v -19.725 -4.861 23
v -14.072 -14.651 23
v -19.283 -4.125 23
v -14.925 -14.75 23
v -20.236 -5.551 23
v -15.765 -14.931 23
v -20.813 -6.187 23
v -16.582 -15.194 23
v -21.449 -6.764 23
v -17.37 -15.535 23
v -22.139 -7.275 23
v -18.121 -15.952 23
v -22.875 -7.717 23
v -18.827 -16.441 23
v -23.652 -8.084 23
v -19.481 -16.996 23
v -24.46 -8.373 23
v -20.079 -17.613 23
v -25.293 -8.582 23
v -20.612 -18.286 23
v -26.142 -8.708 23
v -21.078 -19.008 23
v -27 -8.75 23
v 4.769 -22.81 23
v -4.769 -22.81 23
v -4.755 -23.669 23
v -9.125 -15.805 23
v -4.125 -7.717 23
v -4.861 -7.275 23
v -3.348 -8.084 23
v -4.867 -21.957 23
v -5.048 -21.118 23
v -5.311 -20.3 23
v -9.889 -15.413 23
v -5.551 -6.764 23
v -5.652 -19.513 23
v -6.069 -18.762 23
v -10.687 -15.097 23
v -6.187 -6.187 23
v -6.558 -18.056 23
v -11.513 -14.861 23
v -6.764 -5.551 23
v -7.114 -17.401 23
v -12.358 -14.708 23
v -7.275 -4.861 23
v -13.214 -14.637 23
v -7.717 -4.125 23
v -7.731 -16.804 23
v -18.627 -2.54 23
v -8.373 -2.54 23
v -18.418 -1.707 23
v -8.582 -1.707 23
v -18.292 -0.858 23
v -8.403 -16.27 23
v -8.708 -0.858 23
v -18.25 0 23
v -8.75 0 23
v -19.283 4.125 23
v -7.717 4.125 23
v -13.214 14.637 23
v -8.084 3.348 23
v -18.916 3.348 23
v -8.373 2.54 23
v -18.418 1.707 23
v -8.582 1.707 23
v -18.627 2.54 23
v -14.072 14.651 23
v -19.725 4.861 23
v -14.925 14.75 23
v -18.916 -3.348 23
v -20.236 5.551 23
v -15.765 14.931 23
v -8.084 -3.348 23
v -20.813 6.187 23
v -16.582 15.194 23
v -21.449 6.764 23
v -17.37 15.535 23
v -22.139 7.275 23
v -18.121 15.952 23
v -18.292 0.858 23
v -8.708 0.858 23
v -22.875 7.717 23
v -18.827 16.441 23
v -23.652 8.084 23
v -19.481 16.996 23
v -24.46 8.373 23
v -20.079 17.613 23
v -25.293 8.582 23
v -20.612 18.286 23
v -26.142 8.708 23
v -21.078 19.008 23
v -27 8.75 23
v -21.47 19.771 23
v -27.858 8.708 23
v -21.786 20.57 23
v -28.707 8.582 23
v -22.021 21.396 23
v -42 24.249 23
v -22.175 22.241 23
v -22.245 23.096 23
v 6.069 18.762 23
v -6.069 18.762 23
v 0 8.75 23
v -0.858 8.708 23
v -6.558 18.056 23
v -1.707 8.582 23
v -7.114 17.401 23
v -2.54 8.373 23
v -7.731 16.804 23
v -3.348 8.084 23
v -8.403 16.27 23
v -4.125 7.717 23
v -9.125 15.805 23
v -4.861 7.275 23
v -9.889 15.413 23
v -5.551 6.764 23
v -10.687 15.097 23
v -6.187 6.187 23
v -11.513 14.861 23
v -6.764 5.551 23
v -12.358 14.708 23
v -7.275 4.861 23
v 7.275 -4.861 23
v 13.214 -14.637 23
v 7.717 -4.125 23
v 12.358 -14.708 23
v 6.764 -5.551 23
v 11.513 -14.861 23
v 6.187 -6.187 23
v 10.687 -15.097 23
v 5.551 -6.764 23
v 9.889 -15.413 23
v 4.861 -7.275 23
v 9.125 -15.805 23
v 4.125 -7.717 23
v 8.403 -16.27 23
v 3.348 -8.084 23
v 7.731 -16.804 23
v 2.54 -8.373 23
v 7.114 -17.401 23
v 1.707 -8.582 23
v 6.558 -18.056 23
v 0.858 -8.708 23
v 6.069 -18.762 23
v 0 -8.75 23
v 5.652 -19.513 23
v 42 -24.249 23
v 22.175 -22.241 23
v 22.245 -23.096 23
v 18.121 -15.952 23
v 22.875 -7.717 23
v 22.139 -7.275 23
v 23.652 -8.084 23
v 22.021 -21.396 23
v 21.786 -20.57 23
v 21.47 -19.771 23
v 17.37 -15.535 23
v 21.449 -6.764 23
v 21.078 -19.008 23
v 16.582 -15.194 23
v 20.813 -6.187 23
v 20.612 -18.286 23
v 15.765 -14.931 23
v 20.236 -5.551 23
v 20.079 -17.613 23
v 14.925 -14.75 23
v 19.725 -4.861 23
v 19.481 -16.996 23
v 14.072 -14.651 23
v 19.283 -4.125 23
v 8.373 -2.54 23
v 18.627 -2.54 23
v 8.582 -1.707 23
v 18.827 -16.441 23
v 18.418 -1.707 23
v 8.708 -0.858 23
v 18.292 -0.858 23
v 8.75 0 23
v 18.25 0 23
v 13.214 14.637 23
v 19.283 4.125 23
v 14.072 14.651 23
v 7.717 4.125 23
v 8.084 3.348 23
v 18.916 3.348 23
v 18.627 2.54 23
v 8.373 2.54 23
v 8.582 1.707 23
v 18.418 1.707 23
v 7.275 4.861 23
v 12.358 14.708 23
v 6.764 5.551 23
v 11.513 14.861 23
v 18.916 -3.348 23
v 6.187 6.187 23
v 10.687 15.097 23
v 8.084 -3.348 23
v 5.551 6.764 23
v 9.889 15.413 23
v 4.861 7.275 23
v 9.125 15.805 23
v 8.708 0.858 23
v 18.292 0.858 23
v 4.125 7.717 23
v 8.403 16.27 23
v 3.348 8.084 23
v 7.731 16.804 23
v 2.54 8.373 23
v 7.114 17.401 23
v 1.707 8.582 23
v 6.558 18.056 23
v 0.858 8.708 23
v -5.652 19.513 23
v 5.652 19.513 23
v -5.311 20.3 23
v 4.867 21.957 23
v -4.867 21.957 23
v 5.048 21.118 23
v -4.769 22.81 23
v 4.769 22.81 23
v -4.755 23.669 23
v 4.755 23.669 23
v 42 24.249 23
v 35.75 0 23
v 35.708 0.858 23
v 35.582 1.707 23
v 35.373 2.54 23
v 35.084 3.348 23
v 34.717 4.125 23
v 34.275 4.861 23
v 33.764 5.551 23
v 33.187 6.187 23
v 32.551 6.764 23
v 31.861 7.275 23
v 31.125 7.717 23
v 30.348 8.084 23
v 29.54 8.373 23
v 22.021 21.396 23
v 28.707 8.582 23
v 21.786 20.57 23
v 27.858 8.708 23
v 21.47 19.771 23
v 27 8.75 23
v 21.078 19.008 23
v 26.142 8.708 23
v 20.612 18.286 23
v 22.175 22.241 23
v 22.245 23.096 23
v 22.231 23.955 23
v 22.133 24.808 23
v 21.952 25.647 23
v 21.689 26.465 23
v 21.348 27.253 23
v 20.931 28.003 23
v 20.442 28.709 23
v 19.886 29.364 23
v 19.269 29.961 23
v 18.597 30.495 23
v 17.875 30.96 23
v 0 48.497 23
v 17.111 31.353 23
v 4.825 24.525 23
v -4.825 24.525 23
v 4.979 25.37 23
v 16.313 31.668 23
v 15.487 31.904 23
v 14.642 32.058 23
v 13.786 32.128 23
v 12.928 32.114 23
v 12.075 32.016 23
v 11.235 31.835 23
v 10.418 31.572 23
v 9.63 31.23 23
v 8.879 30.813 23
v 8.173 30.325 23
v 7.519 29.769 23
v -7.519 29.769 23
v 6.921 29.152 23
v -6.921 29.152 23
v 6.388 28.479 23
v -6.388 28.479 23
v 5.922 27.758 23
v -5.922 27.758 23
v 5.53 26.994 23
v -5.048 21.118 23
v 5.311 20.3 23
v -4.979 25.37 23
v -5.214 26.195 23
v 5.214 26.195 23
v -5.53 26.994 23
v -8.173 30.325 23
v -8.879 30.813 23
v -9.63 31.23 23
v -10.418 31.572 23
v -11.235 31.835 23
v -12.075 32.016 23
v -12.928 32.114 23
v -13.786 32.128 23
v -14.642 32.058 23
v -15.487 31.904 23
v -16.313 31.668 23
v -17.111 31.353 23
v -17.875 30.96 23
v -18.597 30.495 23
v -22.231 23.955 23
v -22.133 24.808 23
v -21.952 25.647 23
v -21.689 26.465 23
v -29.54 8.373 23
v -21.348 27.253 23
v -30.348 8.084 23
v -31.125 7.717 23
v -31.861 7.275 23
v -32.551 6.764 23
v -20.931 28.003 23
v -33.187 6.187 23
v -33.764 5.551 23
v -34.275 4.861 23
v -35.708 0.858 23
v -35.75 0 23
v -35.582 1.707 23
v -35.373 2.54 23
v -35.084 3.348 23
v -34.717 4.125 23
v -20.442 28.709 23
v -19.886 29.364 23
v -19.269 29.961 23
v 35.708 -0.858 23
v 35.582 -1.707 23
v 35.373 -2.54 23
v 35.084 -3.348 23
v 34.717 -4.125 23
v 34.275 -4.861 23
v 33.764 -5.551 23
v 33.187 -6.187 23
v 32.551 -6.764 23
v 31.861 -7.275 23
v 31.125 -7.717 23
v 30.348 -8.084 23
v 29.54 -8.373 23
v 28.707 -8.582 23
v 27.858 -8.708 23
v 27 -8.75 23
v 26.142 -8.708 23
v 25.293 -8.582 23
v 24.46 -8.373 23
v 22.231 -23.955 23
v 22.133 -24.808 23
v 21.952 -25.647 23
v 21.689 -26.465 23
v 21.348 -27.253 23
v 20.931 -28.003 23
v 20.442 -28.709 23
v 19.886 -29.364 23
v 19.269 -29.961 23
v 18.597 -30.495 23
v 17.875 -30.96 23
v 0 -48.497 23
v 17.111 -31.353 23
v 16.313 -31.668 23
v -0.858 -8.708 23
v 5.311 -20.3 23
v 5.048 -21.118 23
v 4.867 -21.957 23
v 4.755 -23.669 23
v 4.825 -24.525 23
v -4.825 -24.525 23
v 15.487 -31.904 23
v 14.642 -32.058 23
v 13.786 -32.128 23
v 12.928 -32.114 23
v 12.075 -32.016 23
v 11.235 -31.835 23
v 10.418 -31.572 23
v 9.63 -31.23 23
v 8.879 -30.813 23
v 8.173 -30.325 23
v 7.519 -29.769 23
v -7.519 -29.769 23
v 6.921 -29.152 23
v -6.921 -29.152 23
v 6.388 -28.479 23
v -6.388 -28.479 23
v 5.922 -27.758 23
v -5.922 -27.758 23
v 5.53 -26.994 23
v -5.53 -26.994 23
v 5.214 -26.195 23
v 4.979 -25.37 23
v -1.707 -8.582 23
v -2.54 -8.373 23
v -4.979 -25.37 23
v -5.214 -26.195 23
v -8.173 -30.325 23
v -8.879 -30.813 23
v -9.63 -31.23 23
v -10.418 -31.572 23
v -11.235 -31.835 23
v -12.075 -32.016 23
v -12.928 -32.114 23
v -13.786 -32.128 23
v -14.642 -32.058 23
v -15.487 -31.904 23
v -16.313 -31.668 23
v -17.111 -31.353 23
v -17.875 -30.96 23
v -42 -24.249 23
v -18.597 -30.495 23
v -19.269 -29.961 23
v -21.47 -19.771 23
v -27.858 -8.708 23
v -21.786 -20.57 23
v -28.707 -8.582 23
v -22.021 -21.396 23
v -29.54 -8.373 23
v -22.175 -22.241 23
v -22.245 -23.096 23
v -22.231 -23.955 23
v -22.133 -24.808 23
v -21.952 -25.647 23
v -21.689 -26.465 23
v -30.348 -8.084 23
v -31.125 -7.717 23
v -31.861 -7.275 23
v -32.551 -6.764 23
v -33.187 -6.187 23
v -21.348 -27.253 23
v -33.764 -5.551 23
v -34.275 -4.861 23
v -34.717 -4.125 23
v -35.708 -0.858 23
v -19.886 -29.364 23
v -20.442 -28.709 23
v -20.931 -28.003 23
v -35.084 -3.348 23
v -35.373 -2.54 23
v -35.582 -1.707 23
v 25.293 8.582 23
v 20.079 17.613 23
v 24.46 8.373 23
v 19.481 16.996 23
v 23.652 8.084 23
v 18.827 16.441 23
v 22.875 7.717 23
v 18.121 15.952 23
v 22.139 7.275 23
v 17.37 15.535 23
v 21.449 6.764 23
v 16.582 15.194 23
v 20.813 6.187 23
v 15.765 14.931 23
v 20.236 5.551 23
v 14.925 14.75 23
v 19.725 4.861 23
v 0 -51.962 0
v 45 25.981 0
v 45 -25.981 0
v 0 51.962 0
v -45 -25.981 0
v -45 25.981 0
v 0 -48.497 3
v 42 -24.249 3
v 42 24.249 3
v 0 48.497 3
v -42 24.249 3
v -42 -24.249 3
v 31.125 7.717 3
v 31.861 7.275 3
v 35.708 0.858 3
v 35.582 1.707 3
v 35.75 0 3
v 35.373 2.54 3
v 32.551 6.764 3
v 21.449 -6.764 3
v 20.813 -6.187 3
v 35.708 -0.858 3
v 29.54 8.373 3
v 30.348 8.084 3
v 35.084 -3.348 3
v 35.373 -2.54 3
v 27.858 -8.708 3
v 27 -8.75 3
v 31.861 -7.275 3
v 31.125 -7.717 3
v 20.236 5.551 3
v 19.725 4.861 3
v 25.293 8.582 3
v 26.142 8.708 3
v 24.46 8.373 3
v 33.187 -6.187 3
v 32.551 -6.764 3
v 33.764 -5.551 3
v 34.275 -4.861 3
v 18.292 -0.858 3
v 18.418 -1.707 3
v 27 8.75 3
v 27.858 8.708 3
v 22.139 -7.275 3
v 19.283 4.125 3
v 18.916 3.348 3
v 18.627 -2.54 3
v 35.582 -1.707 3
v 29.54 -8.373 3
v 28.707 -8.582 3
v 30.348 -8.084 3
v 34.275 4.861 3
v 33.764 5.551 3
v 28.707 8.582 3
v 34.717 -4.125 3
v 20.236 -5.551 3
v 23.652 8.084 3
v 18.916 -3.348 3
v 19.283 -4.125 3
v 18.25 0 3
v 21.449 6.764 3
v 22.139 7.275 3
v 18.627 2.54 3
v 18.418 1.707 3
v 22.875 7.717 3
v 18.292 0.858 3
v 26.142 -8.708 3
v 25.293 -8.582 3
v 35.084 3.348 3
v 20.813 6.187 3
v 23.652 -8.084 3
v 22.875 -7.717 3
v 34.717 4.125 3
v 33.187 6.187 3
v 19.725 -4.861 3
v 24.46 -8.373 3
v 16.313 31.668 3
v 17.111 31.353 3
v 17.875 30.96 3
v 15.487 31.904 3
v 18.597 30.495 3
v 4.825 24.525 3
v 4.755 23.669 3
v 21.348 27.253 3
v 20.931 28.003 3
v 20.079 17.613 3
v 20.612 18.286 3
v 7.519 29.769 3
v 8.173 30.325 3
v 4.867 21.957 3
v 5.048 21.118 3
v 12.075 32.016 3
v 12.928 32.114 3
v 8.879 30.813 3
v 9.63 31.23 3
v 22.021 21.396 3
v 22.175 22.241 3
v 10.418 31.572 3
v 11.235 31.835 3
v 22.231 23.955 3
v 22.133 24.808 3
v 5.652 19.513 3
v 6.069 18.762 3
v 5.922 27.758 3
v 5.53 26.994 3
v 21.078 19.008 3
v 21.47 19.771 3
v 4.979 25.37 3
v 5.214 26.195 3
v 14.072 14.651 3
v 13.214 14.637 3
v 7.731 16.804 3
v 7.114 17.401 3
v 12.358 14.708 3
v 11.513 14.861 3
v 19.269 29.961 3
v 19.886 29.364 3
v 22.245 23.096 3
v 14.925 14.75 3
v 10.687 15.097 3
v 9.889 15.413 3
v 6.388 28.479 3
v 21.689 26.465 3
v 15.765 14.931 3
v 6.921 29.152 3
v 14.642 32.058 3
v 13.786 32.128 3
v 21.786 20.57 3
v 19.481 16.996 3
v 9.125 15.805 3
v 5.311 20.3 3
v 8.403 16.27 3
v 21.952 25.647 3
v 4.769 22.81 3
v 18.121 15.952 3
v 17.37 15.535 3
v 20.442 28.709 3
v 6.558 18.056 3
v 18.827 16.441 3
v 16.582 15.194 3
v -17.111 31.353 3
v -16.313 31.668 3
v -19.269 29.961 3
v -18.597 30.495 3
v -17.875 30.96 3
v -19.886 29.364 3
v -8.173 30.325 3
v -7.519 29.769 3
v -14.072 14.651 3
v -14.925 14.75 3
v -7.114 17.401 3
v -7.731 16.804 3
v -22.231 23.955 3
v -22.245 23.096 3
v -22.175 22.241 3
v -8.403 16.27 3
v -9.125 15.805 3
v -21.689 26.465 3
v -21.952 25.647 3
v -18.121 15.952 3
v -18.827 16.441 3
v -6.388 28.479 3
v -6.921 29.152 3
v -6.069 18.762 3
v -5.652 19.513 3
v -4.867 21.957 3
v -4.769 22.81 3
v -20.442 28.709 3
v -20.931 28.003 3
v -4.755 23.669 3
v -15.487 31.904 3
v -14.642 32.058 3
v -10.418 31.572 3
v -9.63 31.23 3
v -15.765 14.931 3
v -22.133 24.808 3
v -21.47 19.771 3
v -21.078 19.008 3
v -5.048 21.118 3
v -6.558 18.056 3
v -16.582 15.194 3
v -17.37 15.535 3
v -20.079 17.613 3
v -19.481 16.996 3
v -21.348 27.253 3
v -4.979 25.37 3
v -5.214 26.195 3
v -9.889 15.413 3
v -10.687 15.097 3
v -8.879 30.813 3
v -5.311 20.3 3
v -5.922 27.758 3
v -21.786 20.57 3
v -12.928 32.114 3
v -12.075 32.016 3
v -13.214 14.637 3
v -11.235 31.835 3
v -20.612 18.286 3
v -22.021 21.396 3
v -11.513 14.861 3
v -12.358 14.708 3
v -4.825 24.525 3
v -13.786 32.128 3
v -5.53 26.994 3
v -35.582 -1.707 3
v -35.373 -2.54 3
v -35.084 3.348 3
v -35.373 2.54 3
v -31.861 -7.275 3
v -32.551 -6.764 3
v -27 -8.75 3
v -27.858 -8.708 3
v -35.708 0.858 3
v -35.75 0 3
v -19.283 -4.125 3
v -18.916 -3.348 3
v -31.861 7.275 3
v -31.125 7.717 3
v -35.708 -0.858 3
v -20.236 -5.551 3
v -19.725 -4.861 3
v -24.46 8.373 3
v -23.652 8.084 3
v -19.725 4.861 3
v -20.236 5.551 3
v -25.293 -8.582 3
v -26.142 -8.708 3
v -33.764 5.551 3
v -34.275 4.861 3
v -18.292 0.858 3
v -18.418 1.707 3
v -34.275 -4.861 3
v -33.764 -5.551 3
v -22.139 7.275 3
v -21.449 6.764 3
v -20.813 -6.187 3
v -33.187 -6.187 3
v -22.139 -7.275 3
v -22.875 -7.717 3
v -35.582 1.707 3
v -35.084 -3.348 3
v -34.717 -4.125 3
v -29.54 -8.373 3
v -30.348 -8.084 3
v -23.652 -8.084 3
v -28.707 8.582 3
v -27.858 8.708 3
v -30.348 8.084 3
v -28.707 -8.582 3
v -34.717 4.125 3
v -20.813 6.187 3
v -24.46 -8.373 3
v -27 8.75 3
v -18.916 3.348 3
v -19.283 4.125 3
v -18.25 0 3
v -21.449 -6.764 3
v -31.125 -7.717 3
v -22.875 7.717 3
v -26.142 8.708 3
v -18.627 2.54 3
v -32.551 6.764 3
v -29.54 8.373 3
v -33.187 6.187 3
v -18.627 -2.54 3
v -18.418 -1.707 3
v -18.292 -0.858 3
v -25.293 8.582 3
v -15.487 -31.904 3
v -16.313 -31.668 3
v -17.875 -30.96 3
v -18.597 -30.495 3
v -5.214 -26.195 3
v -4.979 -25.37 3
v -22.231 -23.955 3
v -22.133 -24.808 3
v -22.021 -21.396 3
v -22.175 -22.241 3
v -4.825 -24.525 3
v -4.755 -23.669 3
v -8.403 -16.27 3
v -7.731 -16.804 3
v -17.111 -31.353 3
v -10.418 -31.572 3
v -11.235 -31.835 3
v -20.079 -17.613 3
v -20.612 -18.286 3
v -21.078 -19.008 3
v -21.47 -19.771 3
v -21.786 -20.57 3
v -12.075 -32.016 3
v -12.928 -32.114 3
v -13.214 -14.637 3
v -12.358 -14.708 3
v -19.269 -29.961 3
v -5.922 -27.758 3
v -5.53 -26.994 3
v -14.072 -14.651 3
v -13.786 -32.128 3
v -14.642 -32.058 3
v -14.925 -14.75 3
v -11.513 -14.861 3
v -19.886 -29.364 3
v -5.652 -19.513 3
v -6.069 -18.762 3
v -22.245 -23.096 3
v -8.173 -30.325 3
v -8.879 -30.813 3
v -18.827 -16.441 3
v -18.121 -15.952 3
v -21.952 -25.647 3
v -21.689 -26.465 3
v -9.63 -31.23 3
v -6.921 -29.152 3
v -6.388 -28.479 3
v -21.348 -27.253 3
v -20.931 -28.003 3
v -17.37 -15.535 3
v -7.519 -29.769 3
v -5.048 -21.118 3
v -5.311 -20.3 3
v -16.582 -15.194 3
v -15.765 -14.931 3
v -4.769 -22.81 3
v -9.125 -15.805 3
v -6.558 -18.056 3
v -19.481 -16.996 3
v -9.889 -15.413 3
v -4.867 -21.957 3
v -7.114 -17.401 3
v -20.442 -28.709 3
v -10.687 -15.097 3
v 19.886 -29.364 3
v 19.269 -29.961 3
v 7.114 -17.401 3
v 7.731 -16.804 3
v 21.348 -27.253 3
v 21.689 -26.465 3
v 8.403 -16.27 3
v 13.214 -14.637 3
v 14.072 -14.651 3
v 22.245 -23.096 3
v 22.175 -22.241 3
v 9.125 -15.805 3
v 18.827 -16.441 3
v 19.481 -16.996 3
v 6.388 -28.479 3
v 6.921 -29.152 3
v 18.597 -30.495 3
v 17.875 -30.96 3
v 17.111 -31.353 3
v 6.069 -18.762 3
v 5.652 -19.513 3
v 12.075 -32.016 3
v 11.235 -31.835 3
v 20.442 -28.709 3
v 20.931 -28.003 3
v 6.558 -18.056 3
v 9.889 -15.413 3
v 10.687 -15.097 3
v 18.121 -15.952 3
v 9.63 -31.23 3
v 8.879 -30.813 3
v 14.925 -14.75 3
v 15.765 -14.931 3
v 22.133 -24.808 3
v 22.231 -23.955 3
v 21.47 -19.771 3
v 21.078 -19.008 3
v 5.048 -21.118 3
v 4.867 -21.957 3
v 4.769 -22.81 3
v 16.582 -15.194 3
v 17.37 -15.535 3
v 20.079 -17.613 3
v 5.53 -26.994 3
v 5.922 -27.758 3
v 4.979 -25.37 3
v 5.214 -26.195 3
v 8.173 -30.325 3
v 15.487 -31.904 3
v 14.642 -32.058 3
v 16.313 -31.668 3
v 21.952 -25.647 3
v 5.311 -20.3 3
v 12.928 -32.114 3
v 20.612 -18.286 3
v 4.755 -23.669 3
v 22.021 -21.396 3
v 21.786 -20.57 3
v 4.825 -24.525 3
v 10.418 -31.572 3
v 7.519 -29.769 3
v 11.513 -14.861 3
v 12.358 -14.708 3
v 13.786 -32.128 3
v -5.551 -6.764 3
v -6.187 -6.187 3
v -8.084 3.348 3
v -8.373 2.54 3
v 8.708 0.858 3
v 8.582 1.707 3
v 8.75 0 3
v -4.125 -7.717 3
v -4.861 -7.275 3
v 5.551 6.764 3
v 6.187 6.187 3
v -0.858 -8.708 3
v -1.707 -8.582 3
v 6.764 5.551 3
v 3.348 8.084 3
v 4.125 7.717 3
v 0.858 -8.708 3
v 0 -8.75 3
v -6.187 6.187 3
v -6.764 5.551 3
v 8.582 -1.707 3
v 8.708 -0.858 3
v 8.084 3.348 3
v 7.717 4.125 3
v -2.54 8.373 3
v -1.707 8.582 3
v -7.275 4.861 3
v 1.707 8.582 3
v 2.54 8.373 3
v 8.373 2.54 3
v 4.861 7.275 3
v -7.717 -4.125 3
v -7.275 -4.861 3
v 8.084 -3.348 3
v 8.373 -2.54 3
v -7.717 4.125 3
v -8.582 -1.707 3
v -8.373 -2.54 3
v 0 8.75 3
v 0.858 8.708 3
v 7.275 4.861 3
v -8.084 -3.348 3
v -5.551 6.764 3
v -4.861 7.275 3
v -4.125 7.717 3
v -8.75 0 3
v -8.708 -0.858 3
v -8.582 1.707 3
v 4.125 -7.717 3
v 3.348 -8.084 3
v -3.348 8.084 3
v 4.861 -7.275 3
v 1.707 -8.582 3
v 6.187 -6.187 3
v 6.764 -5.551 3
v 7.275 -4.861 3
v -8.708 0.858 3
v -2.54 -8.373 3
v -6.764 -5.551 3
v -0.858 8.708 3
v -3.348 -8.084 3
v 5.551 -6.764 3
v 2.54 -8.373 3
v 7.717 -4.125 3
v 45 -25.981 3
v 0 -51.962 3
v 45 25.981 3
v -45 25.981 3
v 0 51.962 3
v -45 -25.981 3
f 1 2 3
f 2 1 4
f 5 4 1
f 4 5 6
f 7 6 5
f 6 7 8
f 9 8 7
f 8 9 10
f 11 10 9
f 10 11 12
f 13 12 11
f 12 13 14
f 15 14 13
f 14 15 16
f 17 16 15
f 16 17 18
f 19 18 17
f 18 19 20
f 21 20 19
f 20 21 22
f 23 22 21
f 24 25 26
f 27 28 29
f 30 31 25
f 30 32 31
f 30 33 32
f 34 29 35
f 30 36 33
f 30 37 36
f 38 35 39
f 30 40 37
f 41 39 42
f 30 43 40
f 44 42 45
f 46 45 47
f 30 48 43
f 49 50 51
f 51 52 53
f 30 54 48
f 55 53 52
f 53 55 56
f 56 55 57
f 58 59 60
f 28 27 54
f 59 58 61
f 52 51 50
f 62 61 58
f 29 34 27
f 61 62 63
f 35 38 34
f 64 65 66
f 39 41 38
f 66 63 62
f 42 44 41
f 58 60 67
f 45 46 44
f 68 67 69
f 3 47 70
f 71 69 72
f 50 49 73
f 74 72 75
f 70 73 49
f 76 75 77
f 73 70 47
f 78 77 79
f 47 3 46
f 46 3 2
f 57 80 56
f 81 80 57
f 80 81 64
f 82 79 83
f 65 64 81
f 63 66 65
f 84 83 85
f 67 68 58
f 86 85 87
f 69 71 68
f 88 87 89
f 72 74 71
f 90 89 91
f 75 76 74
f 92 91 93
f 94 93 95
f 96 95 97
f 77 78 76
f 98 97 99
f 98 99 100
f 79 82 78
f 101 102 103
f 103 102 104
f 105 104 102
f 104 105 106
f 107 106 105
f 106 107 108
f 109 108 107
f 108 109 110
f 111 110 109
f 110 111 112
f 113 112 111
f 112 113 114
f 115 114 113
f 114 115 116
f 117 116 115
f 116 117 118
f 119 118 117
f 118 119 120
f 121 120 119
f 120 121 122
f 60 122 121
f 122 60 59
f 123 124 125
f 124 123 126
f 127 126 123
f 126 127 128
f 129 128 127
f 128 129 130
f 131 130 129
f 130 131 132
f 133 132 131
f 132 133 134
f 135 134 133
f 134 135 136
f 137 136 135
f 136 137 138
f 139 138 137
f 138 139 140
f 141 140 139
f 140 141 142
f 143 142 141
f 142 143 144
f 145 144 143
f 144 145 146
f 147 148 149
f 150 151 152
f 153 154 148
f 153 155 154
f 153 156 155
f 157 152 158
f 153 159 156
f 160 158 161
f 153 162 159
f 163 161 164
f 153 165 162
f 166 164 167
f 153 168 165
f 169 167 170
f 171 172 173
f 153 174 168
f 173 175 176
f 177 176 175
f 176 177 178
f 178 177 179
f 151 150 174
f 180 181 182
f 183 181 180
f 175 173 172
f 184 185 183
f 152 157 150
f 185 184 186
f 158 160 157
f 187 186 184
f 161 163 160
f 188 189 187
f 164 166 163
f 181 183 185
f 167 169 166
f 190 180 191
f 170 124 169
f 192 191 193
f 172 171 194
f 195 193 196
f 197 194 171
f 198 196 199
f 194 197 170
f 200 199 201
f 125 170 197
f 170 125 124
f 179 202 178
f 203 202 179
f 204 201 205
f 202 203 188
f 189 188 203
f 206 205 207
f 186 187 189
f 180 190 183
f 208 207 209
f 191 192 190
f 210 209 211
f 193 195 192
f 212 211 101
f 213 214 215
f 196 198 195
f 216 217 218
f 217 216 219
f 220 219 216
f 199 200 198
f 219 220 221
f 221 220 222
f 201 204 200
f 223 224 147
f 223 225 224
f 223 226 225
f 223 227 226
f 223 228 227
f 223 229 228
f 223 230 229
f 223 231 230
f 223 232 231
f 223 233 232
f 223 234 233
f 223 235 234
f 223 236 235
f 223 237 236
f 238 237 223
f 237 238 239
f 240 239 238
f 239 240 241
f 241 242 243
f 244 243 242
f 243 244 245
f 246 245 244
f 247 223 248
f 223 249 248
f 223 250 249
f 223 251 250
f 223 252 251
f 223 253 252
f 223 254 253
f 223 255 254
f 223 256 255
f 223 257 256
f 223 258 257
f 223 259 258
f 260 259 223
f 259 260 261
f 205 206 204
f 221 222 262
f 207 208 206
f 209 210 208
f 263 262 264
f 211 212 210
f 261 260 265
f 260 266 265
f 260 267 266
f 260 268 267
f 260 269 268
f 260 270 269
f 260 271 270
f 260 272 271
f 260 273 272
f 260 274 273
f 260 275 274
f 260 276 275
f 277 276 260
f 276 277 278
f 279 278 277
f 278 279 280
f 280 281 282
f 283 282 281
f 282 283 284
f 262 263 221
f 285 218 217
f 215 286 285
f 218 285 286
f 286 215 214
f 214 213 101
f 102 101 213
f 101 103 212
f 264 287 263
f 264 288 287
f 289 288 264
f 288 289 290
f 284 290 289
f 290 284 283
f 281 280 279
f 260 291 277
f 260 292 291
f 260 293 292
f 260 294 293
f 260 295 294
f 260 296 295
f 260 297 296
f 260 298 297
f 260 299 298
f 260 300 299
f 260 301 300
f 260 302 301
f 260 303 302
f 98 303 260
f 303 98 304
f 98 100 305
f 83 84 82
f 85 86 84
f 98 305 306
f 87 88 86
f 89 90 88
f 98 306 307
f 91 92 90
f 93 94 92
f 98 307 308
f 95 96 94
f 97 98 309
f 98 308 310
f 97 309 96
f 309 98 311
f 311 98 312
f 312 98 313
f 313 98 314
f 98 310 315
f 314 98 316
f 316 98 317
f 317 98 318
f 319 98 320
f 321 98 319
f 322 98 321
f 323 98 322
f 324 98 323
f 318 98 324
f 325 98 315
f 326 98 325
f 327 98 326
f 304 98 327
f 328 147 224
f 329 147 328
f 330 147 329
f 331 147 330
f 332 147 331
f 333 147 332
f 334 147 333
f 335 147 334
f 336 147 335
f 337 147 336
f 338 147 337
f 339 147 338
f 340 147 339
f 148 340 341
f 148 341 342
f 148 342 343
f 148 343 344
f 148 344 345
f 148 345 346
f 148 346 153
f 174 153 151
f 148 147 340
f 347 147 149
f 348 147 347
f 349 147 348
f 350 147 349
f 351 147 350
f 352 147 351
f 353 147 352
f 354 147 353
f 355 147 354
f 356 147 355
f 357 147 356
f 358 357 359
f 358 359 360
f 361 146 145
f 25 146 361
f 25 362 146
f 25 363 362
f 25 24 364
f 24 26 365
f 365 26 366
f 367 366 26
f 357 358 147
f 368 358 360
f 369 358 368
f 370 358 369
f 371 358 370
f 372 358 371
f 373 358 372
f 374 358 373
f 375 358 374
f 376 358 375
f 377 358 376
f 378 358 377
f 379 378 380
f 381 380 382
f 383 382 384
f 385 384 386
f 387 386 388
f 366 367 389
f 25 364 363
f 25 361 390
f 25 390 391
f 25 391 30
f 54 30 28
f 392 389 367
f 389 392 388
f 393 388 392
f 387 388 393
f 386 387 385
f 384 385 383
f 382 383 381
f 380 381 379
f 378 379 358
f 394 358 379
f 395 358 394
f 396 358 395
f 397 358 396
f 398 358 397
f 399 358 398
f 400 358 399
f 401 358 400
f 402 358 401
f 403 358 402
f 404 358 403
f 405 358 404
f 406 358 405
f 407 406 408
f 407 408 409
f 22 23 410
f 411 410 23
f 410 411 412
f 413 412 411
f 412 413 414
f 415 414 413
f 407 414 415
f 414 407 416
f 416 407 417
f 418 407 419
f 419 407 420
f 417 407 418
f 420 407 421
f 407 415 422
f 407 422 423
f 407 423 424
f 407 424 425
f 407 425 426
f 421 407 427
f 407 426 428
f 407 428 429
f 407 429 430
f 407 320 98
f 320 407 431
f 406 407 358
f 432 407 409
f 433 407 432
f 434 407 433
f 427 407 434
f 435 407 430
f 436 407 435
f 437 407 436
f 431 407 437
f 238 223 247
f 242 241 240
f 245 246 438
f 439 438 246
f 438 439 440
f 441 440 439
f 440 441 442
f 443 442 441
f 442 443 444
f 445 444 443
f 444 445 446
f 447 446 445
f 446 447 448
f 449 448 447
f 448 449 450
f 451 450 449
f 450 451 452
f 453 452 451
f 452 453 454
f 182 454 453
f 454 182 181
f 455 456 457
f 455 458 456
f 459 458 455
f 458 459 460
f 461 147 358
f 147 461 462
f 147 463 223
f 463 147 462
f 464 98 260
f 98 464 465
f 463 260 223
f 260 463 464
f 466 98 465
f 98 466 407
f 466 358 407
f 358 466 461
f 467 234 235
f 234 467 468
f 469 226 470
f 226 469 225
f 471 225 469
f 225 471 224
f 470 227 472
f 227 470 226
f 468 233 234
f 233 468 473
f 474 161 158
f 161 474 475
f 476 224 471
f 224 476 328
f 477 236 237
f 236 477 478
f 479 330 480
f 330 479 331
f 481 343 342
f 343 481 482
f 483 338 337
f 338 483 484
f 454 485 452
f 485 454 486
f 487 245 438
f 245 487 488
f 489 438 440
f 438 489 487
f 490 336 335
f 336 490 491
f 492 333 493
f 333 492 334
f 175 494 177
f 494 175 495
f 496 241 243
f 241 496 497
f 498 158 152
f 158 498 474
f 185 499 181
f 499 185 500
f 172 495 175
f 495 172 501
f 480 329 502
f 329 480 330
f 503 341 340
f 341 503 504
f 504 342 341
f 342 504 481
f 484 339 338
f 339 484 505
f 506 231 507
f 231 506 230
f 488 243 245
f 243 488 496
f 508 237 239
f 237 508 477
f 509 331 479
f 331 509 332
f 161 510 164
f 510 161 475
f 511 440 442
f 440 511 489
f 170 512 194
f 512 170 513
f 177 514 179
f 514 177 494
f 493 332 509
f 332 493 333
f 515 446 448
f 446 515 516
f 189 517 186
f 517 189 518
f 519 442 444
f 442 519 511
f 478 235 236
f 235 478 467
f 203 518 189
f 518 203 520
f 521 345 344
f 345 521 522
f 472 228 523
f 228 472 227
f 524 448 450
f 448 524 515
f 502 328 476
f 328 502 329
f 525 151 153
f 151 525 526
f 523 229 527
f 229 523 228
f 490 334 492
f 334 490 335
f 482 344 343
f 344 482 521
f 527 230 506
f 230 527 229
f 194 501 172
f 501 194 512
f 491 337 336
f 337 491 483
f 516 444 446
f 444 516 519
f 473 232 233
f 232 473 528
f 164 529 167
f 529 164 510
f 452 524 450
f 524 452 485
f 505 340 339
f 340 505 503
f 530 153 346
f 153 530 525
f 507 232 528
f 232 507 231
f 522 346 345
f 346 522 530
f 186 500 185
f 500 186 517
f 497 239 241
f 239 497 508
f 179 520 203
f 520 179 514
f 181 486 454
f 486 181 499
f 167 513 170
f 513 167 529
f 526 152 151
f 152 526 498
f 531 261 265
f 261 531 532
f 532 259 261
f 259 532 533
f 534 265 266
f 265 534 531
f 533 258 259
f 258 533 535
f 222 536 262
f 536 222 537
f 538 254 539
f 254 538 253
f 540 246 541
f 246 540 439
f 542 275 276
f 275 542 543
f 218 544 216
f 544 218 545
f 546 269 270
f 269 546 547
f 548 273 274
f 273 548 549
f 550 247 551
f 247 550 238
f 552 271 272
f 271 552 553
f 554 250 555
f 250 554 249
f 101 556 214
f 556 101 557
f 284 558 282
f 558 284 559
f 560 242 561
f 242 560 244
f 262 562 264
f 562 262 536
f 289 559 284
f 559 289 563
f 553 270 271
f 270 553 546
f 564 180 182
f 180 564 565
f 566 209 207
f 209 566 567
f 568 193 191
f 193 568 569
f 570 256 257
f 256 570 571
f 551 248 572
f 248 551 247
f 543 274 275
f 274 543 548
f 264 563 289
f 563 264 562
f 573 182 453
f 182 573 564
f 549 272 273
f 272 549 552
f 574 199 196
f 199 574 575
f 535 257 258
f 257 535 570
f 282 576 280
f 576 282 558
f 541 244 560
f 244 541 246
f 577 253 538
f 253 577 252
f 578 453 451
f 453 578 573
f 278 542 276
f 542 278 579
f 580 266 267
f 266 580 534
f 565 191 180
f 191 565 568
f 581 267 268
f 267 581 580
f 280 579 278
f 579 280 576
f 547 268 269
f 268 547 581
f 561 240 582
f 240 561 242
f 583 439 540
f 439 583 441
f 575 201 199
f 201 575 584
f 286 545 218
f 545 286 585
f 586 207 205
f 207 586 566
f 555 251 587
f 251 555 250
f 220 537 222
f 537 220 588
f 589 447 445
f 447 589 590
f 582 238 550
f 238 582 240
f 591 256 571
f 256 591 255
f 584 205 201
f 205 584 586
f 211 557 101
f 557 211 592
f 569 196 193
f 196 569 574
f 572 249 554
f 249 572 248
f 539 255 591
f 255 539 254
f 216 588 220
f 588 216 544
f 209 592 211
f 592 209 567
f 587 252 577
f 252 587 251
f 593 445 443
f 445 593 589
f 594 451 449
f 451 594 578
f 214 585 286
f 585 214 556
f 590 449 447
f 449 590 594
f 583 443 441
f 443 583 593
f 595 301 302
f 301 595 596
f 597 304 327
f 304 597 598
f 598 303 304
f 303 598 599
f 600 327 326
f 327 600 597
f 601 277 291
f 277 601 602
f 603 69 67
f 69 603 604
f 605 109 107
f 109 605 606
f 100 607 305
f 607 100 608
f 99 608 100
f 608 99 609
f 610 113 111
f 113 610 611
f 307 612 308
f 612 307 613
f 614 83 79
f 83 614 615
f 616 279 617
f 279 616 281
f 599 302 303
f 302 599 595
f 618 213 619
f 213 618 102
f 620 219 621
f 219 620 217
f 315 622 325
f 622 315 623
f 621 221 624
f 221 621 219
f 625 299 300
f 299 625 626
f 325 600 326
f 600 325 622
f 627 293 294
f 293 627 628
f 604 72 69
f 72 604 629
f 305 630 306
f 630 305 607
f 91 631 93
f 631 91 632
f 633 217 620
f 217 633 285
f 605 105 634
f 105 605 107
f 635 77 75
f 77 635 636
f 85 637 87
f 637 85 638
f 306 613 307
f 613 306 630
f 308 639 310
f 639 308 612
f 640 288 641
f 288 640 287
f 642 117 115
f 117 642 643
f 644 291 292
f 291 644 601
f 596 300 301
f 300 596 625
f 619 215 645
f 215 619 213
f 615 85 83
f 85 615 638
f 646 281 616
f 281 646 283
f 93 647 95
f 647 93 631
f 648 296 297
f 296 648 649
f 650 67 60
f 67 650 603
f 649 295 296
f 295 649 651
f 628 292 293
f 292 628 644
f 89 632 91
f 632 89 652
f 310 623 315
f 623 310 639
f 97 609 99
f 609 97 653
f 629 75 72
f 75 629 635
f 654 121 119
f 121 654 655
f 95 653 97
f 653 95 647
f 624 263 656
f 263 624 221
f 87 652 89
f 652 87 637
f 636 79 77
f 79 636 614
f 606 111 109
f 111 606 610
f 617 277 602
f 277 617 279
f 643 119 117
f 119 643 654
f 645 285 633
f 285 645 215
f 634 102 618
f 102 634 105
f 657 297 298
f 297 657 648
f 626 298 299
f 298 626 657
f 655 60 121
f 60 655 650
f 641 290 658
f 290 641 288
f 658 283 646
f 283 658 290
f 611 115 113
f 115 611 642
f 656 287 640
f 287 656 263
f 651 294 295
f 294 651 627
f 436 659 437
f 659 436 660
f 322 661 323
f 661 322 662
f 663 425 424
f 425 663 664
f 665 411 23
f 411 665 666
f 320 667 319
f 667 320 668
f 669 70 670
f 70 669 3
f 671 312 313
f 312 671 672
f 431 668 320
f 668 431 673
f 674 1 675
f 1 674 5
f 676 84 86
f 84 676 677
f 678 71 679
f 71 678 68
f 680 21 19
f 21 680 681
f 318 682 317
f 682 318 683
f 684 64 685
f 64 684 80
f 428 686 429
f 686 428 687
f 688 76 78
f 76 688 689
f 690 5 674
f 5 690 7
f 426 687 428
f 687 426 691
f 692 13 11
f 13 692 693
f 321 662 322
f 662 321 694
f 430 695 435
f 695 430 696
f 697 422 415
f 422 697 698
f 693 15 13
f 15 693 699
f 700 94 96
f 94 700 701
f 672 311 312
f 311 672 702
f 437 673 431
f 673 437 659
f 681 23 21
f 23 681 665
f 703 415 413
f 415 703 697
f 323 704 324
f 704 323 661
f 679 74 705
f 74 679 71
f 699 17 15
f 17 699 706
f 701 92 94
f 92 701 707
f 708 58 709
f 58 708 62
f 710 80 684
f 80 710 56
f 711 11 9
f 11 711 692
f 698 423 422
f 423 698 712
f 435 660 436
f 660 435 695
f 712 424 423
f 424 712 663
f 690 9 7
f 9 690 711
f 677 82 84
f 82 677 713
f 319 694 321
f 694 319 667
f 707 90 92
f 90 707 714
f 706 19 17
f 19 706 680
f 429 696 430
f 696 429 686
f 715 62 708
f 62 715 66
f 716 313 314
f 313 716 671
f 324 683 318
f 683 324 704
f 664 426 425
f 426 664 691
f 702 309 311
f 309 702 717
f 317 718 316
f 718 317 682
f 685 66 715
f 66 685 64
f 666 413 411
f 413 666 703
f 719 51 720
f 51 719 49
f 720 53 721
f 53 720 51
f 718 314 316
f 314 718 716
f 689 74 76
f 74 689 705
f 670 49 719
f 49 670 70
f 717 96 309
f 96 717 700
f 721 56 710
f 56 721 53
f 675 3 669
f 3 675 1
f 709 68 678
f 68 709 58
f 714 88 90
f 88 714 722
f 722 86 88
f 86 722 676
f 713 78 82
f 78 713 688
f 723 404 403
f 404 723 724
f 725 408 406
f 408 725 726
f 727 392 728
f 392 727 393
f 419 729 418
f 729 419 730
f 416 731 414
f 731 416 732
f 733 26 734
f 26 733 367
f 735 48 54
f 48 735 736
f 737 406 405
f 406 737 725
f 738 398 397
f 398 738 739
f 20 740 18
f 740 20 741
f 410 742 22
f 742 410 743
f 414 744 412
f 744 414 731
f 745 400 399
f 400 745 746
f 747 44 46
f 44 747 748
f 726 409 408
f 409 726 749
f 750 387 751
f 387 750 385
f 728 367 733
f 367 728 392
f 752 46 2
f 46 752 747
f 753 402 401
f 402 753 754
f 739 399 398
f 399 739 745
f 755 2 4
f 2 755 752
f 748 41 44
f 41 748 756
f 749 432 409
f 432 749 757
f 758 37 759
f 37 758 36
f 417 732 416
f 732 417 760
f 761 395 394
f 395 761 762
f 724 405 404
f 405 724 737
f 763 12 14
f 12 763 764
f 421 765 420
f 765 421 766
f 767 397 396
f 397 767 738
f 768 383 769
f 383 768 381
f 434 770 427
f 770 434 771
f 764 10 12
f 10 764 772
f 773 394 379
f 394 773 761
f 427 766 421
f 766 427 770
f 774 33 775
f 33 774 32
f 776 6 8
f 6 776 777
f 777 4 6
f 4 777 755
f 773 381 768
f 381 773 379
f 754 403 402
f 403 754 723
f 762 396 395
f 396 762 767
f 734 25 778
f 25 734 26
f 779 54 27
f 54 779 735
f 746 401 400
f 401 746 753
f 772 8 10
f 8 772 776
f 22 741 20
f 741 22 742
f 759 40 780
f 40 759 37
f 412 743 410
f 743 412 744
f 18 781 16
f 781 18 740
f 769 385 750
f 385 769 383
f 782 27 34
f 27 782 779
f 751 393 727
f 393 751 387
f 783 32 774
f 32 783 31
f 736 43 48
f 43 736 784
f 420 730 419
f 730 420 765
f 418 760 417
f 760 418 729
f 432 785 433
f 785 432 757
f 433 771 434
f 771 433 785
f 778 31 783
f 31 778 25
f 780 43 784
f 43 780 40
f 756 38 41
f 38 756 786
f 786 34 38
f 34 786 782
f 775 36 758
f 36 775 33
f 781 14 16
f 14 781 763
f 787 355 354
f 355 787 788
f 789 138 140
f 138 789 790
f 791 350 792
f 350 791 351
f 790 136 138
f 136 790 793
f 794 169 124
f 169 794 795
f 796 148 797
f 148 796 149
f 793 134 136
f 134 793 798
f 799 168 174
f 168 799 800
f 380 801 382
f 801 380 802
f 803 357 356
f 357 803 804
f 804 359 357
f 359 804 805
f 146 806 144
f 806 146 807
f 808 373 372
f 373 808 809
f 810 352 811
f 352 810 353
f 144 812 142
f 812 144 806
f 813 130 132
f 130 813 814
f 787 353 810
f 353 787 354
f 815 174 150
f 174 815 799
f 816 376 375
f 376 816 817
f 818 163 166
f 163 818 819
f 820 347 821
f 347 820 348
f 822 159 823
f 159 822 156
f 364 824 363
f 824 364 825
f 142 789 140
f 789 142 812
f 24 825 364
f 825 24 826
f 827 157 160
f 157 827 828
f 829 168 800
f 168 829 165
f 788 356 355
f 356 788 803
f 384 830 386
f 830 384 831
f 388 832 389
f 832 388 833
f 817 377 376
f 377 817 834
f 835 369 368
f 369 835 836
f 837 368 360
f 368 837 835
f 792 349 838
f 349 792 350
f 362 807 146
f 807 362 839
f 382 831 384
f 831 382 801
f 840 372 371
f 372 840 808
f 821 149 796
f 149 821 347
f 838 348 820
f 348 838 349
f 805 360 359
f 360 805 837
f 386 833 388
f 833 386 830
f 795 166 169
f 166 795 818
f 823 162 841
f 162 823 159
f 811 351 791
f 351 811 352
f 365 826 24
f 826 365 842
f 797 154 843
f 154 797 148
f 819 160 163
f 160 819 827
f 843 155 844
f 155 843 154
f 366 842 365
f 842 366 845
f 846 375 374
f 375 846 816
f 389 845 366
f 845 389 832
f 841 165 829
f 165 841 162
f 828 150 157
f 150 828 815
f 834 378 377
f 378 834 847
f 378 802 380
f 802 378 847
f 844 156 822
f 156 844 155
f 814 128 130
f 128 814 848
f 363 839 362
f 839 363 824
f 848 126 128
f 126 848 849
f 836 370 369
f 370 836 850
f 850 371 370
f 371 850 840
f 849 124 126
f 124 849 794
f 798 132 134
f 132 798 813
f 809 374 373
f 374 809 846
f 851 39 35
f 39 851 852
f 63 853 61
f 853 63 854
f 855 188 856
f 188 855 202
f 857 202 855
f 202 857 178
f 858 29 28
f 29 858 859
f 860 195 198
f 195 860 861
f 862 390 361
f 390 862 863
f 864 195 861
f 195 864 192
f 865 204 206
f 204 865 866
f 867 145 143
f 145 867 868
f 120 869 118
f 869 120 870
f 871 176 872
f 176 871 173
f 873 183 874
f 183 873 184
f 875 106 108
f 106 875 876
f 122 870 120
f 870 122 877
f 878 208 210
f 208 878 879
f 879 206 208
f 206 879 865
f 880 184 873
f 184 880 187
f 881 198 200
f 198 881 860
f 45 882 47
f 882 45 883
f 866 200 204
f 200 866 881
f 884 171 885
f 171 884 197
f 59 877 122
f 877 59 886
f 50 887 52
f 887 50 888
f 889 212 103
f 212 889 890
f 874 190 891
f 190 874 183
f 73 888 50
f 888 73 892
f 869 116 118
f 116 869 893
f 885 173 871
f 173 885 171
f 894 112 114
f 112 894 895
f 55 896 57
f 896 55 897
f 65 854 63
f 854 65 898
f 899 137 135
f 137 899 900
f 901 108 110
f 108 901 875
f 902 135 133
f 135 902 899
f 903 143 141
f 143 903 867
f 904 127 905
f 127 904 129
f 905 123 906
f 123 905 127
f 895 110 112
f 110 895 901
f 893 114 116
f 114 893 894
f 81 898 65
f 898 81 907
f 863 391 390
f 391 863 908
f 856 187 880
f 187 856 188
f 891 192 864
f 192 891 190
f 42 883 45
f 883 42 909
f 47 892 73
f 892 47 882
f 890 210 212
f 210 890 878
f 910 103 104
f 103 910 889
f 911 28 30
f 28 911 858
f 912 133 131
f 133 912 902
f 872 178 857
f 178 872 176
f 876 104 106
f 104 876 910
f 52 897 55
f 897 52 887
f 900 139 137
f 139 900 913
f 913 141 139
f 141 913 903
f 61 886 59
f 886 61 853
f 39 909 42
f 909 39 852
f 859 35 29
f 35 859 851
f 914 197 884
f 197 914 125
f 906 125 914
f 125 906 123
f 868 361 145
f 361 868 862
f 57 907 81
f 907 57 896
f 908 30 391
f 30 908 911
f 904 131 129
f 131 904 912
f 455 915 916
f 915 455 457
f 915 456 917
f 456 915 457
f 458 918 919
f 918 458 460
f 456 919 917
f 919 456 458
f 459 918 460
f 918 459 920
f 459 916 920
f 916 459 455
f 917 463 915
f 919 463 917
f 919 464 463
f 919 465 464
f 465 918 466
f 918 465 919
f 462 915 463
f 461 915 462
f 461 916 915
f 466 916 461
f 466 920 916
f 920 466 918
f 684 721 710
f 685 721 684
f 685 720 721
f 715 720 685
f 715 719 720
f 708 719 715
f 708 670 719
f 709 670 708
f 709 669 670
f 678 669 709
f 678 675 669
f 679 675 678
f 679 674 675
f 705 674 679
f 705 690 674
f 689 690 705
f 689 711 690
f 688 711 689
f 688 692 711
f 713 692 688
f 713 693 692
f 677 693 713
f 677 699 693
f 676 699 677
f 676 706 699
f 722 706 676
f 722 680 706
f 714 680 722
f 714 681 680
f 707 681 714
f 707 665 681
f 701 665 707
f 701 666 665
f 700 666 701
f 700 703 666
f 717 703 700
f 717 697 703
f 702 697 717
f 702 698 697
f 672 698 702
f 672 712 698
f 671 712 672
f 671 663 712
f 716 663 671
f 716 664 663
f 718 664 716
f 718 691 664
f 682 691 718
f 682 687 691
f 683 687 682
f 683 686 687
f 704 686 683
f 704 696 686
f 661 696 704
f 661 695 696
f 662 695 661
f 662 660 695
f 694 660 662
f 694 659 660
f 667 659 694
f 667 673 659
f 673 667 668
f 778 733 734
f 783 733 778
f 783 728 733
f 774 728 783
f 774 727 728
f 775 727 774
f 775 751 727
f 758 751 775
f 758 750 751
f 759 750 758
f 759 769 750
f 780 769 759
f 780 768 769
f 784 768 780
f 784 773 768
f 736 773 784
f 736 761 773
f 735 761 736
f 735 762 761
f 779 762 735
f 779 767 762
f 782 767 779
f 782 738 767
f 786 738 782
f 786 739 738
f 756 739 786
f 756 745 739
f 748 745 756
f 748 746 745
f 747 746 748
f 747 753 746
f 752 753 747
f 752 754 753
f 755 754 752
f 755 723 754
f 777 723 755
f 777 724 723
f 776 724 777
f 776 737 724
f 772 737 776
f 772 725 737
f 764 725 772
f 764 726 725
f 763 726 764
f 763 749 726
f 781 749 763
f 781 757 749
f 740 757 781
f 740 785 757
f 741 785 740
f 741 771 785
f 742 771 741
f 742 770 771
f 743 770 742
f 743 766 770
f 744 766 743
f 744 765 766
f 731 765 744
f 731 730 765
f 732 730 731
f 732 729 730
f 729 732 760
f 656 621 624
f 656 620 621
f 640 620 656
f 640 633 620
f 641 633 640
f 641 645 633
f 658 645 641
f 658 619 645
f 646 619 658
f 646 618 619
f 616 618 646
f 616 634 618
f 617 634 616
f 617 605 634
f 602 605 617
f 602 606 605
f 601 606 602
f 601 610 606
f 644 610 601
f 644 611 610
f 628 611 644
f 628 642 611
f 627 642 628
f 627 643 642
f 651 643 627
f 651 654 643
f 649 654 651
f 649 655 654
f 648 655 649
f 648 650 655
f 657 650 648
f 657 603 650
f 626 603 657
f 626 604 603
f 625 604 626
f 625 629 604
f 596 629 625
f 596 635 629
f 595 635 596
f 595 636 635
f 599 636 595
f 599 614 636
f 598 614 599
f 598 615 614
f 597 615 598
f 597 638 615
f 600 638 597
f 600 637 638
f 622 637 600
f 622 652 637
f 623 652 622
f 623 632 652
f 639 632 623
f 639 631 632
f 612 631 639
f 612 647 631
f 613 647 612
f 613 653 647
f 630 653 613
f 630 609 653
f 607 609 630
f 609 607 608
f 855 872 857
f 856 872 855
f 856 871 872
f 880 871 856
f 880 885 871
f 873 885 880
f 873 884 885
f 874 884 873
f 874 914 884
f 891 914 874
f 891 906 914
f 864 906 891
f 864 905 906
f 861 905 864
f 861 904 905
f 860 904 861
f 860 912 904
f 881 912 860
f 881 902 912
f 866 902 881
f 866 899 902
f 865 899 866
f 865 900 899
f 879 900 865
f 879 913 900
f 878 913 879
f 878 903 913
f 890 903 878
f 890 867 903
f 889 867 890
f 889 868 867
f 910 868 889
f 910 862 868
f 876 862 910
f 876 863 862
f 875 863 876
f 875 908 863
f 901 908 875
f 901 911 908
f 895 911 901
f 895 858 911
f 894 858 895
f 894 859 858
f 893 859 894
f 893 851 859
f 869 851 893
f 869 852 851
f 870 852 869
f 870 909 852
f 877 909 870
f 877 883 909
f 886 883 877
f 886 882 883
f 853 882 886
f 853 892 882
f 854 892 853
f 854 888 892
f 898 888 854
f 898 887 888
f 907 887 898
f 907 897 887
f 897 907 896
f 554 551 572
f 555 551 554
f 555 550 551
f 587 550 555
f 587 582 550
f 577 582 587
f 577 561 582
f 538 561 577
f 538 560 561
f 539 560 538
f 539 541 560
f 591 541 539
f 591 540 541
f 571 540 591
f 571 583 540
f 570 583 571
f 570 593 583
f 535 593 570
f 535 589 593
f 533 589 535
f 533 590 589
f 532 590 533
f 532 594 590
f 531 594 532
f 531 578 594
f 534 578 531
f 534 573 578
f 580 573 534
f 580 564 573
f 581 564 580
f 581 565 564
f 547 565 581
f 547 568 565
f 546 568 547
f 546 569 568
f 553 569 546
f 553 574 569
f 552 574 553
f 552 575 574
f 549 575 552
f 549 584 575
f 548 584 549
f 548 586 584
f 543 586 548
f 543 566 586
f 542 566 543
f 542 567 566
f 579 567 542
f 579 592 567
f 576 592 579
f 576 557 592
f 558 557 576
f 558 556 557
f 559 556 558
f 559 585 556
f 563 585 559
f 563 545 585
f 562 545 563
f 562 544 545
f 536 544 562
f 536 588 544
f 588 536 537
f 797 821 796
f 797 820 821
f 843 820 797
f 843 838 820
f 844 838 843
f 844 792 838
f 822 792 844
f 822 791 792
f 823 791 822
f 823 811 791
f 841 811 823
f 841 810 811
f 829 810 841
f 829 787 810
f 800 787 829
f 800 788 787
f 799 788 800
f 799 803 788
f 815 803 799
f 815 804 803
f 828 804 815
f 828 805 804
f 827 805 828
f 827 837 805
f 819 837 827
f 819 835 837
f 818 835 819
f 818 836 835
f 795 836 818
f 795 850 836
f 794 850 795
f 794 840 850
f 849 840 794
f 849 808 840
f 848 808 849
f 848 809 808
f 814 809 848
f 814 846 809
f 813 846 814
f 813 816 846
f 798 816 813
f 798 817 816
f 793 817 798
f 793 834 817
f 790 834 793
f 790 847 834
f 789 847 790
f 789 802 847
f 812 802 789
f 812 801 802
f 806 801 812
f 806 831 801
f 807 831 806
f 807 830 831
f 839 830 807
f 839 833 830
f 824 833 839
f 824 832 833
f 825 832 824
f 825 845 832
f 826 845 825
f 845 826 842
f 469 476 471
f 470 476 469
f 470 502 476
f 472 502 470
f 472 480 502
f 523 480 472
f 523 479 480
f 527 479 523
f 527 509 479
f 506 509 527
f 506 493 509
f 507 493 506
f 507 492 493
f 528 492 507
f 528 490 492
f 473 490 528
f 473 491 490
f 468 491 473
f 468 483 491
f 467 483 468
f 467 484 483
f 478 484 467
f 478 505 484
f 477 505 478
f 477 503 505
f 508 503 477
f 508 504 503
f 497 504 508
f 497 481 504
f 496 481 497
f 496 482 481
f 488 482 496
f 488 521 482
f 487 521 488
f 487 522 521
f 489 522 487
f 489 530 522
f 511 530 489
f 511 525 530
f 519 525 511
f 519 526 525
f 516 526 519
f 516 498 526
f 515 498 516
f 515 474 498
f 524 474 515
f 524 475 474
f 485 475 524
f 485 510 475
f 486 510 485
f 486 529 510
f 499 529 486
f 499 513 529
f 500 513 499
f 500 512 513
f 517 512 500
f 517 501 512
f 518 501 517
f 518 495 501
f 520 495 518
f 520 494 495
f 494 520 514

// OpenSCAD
// --- Dimensions ---
plate_thickness = 3;           // Thickness of the base plate
hexagon_across_flats = 90;      // Width of the hexagonal plate (flat-to-flat)
skirt_across_flats = 84;        // Width of the hexagonal skirt (flat-to-flat)
skirt_wall_thickness = 2;       // Thickness of the skirt wall
skirt_height = 20;              // Height of the skirt and sleeves

hole_diameter = 17.5;           // Diameter of the conical tube holes
hole_spacing_diameter = 54;     // Diameter of the circle passing through hole centers
sleeve_outer_diameter = 21.5;   // Outside diameter of the sleeves
sleeve_wall_thickness = 2;      // Wall thickness of the sleeves
sleeve_height = 20;             // Height of the sleeves

// --- Constants ---
$fn = 64;

// --- Helper Modules ---

// Function to calculate the radius of a hexagon given the distance across flats
function hex_radius(across_flats) = (across_flats / 2) / cos(30);

// Module to create a hexagonal prism
module hexagon_prism(across_flats, height) {
    r = hex_radius(across_flats);
    // We use 6 sides. To ensure flats are parallel to X axis, 
    // we rotate the polygon or the extrusion.
    // A standard polygon with 6 vertices at 0, 60, 120... has points on X axis.
    // To have flats parallel to X, we rotate 30 degrees.
    rotate([0, 0, 30])
    cylinder(h = height, r = r, $fn = 6);
}

// --- Main Construction ---
// The user requested the part be printed "upside down".
// However, the instructions say: "A flat plate... lies on the bed (z = 0 to 3)".
// This implies the plate is the base of the print. 
// I will model it exactly as described: Plate at Z=0, features rising to Z=20.
// When the user "flips it for use", the skirt/sleeves will trap air.

union() {
    // 1. The Base Plate
    // A hexagon with 90mm across flats.
    hexagon_prism(hexagon_across_flats, plate_thickness);

    // 2. The Sleeves and Skirt
    // We use a union for the positive features, then subtract the holes.
    difference() {
        union() {
            // The Hexagonal Skirt
            hexagon_prism(skirt_across_flats, skirt_height + plate_thickness);

            // The 7 Sleeves
            // Center sleeve
            cylinder(h = sleeve_height + plate_thickness, d = sleeve_outer_diameter);

            // 6 Peripheral sleeves
            for (i = [0 : 5]) {
                angle = i * 60;
                rotate([0, 0, angle])
                translate([hole_spacing_diameter / 2, 0, 0])
                cylinder(h = sleeve_height + plate_thickness, d = sleeve_outer_diameter);
            }
        }

        // --- Subtraction: The Holes ---
        // We subtract the holes from the entire assembly.
        // To ensure clean cuts, we extend the cylinders slightly.
        
        // Center hole
        translate([0, 0, -0.01])
        cylinder(h = plate_thickness + sleeve_height + 2, d = hole_diameter);

        // Peripheral holes
        for (i = [0 : 5]) {
            angle = i * 60;
            rotate([0, 0, angle])
            translate([hole_spacing_diameter / 2, 0, -0.01])
            cylinder(h = plate_thickness + sleeve_height + 2, d = hole_diameter);
        }
    }
}

// Note on orientation: 
// The model is built with the plate at Z=0. 
// To use it as a float, the user will flip it so the skirt/sleeves face down.
